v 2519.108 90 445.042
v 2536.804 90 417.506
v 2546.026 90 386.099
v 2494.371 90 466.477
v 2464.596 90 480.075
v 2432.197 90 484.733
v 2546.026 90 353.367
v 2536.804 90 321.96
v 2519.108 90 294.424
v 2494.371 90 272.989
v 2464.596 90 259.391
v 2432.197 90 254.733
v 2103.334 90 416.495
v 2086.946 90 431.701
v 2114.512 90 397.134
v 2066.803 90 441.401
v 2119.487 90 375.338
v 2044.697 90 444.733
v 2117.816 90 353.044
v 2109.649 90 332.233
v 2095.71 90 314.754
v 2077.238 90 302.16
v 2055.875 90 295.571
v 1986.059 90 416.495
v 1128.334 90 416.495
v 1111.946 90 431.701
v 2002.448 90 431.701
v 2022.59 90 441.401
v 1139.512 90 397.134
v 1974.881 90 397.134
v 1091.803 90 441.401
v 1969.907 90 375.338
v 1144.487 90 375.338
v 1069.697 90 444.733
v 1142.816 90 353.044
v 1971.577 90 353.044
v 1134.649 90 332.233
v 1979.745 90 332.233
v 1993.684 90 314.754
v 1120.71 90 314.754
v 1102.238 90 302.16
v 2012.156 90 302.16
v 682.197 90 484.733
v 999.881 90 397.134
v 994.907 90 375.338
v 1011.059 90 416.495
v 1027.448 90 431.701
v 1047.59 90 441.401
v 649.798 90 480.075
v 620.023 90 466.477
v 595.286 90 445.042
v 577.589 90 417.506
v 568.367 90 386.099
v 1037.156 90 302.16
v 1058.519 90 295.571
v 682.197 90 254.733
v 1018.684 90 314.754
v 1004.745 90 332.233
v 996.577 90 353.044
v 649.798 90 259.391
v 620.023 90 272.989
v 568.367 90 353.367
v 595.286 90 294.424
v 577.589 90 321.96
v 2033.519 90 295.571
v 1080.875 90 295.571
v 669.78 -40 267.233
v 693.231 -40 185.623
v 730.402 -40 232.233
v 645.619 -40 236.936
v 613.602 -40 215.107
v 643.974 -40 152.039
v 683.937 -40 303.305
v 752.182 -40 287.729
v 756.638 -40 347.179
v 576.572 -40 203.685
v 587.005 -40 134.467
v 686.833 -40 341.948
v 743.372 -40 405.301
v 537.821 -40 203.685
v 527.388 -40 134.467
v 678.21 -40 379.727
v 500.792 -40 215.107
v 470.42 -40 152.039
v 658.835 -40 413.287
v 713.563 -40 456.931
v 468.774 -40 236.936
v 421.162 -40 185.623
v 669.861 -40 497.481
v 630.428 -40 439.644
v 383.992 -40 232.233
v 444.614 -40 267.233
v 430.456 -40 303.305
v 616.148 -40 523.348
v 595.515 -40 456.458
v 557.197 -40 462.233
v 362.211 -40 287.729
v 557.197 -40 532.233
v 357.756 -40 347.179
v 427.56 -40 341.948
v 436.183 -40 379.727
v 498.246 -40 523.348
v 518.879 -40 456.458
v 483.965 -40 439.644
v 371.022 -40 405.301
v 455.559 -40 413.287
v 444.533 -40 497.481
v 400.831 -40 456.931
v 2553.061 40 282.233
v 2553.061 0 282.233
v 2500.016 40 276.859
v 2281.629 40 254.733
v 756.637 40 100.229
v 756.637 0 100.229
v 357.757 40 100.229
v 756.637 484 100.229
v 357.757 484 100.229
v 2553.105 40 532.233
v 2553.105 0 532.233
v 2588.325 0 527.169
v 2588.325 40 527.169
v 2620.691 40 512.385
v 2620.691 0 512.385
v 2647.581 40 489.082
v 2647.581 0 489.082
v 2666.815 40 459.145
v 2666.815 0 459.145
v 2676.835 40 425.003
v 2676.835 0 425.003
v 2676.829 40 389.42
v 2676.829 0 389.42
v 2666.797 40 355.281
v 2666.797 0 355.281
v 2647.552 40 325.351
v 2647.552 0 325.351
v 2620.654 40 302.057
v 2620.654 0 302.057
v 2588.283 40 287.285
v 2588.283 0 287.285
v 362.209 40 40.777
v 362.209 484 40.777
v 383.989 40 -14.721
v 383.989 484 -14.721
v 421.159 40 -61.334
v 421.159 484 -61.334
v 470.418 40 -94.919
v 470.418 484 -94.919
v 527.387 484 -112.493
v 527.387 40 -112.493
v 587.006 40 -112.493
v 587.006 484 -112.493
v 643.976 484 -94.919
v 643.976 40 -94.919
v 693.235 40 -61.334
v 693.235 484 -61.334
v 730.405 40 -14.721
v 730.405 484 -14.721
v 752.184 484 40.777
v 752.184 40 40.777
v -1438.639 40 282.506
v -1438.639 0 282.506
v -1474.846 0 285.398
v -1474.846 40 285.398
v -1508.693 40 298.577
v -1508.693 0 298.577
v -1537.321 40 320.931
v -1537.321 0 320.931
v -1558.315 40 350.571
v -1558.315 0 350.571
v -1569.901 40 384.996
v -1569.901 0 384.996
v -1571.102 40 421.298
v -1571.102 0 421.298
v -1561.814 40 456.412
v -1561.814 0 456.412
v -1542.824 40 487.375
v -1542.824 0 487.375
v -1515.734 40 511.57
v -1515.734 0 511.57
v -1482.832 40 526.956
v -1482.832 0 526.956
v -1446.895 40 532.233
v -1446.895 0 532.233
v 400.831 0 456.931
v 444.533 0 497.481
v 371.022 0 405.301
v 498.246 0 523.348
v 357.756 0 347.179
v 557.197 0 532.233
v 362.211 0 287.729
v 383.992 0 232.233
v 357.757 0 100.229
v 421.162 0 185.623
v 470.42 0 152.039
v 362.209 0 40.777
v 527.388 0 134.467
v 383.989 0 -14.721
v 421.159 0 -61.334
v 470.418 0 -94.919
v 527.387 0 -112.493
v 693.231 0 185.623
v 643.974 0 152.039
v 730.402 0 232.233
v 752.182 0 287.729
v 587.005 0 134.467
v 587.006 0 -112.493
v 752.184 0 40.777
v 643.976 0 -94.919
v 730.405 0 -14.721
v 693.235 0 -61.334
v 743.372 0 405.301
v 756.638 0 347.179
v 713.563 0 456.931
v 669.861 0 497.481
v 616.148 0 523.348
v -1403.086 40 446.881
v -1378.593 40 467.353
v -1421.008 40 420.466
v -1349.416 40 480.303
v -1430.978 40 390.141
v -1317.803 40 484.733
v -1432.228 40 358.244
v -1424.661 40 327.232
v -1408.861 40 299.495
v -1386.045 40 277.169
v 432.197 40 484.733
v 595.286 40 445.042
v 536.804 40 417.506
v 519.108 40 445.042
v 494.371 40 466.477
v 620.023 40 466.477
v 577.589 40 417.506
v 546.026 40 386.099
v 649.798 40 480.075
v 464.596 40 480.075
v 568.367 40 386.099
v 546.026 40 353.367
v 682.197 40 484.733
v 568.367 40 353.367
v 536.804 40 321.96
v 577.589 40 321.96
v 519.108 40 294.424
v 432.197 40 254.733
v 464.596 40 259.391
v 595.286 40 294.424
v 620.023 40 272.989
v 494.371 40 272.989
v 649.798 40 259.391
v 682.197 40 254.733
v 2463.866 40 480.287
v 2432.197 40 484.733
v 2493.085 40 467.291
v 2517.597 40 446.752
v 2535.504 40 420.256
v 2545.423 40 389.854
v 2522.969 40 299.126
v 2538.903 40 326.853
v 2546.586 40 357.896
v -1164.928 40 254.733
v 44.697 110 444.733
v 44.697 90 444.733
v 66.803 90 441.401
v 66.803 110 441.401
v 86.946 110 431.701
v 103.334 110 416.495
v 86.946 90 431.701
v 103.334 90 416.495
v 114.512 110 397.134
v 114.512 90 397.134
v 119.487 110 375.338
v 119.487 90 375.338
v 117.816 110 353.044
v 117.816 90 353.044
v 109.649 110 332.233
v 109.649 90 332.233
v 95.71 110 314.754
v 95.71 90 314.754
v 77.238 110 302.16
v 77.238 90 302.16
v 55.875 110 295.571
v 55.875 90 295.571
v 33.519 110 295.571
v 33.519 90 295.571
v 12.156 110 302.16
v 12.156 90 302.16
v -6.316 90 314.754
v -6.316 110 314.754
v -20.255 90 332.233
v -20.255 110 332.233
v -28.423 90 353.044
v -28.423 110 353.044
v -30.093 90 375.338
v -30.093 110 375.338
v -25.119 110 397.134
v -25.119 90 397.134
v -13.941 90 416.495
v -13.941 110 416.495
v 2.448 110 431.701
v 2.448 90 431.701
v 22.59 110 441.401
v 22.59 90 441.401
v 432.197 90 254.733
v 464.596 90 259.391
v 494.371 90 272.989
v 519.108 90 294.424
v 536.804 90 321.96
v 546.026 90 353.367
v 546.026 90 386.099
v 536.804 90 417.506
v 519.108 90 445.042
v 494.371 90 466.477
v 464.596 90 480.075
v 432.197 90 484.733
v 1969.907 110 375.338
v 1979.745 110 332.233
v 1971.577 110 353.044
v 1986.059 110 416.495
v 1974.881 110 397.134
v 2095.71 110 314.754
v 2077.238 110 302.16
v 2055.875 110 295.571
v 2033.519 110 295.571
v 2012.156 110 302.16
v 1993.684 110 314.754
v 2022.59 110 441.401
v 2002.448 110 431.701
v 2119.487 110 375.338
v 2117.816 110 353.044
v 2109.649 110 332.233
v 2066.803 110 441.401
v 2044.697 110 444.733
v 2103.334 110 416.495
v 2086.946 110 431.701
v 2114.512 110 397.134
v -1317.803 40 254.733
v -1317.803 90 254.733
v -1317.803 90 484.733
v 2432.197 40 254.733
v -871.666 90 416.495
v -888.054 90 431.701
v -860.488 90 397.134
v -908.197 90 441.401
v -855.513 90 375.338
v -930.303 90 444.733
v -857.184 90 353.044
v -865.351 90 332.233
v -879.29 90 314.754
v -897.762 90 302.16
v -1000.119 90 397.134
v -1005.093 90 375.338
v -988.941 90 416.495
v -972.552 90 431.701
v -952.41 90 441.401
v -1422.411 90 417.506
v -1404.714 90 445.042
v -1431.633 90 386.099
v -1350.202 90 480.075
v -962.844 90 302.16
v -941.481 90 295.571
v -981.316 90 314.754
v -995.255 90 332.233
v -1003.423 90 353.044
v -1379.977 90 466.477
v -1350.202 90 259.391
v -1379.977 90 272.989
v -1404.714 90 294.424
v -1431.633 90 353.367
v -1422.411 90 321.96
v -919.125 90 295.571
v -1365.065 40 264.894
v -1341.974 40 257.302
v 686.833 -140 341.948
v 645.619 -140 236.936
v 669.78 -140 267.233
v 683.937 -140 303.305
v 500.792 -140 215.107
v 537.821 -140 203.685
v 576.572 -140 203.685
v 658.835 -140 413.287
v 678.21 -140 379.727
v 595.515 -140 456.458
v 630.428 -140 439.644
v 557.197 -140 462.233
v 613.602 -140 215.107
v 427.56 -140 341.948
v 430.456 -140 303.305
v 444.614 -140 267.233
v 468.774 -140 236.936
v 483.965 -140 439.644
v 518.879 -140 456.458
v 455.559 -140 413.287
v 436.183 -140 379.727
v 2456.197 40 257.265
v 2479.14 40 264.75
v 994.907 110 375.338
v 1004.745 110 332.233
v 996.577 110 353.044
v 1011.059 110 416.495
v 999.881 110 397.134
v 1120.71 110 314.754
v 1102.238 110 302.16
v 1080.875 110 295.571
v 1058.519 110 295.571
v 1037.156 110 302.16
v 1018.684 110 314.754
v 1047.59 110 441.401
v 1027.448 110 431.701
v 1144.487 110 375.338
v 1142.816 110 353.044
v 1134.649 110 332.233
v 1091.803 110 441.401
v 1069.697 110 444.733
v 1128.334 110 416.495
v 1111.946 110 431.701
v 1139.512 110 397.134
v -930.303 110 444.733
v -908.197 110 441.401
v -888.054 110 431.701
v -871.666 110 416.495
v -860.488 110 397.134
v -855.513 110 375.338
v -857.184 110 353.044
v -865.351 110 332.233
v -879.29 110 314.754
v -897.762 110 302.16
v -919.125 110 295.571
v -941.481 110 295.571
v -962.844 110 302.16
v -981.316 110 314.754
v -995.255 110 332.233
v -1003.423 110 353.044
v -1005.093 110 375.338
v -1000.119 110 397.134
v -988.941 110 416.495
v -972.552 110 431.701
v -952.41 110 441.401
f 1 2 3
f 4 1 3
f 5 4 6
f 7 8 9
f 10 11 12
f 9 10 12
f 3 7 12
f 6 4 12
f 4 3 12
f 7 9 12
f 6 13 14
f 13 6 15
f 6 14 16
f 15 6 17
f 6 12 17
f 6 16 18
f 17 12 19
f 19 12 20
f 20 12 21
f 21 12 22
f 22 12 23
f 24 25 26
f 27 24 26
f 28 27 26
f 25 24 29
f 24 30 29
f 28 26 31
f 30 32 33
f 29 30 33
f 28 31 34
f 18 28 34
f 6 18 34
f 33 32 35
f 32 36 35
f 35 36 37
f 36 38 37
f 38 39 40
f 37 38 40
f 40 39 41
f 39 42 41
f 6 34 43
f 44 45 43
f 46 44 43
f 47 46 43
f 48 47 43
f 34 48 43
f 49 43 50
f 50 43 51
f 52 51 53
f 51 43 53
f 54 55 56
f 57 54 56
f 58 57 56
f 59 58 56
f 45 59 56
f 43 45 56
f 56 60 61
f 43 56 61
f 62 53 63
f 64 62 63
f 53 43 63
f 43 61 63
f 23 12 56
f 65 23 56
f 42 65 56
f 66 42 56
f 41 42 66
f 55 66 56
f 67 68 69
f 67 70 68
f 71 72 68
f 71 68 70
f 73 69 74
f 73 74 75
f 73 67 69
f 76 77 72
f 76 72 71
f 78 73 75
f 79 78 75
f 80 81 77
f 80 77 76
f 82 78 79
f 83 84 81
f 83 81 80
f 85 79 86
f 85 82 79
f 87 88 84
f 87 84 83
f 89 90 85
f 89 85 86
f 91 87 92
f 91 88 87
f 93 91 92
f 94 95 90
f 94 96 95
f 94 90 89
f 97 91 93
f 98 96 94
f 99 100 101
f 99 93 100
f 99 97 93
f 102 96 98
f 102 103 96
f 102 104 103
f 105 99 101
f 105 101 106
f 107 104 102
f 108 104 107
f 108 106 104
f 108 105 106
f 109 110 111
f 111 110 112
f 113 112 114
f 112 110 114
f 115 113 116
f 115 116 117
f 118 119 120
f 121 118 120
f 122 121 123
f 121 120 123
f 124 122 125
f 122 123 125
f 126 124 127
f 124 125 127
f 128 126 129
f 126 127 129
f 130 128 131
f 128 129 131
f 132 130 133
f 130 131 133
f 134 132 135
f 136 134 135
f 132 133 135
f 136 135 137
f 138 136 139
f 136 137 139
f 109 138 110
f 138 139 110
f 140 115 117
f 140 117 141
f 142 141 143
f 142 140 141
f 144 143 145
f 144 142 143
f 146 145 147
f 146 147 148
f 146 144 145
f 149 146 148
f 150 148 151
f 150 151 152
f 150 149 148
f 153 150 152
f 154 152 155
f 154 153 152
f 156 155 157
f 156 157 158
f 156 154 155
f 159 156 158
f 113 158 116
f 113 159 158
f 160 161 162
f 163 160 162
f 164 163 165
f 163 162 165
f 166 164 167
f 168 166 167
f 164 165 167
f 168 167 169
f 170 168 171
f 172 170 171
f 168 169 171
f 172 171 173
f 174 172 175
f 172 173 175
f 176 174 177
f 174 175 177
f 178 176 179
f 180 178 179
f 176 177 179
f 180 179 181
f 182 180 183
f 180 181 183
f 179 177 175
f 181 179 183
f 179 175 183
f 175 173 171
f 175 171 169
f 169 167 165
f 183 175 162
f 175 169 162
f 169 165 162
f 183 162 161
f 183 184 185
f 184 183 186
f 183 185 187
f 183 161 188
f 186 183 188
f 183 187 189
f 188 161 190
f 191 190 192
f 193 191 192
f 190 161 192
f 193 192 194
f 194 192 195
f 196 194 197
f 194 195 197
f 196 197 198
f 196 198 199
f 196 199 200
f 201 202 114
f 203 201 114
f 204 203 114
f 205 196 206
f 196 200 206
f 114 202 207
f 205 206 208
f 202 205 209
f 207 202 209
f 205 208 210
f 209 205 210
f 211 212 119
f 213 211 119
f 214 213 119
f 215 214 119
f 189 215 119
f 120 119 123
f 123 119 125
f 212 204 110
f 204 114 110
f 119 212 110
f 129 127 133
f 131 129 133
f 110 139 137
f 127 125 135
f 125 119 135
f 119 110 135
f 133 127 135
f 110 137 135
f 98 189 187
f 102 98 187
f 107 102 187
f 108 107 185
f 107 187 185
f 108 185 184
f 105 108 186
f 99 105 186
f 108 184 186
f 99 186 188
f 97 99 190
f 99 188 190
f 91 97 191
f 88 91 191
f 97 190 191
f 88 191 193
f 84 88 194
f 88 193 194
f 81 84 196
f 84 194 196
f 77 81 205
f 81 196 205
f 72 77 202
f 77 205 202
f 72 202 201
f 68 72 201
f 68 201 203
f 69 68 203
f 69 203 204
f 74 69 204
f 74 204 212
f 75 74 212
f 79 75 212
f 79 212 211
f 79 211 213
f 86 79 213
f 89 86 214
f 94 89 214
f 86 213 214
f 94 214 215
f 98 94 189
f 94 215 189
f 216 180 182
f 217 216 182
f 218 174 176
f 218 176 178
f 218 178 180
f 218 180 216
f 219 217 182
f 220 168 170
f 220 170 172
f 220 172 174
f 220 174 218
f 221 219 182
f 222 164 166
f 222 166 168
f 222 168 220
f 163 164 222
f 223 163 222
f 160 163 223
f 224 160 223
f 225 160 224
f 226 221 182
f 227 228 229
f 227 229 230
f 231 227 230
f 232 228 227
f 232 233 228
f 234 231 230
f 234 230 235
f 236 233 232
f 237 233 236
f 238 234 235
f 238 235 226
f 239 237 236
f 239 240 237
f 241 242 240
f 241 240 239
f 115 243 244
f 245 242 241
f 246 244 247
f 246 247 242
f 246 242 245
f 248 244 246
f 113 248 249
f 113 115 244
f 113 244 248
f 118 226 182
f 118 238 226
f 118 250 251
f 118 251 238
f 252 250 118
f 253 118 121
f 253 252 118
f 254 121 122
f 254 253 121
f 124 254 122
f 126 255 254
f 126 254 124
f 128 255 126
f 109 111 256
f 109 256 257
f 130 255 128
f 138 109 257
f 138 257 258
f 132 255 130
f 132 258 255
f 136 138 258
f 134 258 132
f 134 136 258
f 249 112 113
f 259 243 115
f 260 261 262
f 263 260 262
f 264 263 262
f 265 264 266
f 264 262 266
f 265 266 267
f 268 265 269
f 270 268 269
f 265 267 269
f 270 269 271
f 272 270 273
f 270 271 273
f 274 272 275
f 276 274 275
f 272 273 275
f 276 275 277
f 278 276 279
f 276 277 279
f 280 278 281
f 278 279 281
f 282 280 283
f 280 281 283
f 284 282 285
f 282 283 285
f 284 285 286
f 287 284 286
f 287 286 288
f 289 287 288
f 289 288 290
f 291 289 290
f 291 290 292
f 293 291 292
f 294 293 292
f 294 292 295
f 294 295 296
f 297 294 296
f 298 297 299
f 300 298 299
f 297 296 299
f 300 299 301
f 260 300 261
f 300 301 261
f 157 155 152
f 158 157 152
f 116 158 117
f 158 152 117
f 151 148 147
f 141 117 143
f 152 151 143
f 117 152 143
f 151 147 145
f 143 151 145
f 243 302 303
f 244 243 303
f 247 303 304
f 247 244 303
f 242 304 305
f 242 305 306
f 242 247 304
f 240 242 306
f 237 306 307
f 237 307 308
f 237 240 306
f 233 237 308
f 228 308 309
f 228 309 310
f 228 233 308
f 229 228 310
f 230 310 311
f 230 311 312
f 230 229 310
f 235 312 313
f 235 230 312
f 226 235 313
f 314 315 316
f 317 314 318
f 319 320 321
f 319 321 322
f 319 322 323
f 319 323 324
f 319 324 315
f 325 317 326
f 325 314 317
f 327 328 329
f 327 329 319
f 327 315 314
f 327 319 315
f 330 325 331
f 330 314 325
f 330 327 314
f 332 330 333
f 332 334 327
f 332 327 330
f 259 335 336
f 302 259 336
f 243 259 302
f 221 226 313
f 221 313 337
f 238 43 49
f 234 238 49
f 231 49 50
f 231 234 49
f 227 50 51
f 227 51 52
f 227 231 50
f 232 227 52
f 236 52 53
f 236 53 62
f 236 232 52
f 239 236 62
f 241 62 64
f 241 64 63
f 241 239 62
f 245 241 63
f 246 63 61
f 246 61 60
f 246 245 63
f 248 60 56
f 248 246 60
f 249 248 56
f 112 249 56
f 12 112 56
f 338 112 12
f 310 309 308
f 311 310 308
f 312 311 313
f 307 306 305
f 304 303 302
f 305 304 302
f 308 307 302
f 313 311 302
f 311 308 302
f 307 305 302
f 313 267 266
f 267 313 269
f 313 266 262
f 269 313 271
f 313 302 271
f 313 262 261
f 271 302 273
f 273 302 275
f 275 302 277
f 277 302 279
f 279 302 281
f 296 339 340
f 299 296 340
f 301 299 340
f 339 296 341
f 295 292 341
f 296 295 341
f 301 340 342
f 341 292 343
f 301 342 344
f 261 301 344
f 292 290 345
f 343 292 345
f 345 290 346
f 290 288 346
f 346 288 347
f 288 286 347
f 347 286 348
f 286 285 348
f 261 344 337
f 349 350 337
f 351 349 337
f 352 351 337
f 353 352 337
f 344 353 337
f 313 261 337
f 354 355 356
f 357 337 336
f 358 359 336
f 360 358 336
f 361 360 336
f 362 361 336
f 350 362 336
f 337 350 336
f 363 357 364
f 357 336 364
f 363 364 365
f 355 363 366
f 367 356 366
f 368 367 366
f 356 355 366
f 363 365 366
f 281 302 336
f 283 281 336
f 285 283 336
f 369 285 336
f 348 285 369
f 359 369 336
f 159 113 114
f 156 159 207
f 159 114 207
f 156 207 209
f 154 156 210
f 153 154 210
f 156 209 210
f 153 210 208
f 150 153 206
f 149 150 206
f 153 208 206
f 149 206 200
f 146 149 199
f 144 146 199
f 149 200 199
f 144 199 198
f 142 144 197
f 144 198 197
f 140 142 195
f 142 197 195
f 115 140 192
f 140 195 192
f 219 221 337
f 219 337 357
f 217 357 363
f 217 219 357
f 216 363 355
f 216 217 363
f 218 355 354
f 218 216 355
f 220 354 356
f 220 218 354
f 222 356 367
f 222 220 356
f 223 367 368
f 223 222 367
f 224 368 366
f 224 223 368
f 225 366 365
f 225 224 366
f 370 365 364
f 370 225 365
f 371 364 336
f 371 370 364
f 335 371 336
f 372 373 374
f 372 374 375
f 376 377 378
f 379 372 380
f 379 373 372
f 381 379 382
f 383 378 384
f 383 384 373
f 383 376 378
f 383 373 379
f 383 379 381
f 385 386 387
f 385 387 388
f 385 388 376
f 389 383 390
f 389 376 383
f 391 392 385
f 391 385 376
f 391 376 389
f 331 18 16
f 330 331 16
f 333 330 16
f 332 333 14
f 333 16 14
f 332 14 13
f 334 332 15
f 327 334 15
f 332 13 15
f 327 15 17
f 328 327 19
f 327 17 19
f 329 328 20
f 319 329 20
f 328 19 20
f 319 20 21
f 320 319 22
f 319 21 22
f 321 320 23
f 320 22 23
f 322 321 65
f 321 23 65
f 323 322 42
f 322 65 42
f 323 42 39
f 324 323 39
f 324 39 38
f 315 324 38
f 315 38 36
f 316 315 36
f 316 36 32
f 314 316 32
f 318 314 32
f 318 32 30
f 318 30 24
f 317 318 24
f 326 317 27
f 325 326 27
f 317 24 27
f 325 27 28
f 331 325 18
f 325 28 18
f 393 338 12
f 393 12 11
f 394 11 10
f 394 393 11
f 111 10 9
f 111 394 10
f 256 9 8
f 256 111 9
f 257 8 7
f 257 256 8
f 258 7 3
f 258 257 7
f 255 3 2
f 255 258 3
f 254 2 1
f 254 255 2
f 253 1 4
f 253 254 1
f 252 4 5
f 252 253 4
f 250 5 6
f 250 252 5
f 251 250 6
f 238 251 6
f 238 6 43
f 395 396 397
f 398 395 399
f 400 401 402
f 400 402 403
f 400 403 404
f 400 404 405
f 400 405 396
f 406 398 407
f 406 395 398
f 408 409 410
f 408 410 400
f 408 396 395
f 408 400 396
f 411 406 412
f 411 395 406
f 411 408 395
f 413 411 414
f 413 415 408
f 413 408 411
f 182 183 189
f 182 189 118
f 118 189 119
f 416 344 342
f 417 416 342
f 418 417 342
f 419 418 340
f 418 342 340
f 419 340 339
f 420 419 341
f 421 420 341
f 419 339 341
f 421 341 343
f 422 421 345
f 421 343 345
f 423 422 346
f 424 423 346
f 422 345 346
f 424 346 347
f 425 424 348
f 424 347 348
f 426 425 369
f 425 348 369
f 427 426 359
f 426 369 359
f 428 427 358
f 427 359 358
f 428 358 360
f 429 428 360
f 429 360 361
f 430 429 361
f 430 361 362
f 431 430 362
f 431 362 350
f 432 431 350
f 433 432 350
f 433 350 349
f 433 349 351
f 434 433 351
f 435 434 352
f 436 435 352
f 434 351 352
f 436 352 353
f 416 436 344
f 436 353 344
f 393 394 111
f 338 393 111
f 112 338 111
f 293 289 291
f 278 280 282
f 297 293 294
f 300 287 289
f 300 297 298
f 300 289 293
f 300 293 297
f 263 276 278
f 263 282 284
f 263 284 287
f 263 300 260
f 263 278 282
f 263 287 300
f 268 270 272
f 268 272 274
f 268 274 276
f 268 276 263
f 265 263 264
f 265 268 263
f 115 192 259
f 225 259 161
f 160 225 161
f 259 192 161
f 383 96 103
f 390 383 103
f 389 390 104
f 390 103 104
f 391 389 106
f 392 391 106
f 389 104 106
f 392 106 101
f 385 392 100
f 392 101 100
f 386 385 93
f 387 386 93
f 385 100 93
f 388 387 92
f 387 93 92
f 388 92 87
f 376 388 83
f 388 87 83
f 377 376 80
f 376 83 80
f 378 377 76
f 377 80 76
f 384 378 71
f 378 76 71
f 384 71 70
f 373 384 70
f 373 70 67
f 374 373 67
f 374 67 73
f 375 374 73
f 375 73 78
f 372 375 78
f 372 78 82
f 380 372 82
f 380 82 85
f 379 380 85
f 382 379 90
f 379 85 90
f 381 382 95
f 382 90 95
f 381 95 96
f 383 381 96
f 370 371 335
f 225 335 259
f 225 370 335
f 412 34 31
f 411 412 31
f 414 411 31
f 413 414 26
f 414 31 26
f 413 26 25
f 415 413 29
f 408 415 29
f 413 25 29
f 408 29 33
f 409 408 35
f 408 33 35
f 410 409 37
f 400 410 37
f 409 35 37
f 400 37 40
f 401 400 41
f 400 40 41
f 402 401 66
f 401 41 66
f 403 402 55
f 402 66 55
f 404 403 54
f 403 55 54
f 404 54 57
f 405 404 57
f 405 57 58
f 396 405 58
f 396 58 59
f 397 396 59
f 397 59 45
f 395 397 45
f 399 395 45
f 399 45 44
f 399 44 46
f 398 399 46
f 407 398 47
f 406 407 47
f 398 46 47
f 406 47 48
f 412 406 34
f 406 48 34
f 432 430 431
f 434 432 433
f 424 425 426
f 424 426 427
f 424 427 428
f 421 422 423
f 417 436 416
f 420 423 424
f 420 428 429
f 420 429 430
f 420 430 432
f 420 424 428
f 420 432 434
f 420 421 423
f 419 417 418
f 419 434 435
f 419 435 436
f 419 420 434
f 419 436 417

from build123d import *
from build123d.topology import SkipClean

# Parameters (mm, degrees)
BOSS_EXTRUDE1_DEPTH = 40
BOSS_EXTRUDE2_DEPTH = 50
SKETCH3_R           = 75
BOSS_EXTRUDE3_DEPTH = 20
SKETCH4_R           = 200
BOSS_EXTRUDE4_DEPTH = 40
BOSS_EXTRUDE5_DEPTH = 444
SKETCH6_R           = 130
BOSS_EXTRUDE6_DEPTH = 100


with BuildPart() as part:
    # Sketch1 → Boss-Extrude1 (new body)
    with BuildSketch(Plane(origin=(0, 0, 0), x_dir=(1, 0, 0), z_dir=(0, 1, 0))):
        with BuildLine():
            Line((-1446.895354921, -532.23311623), (2553.104645079, -532.23311623))
            ThreePointArc((2553.104645079, -532.23311623), (2678.104643133, -407.21106021), (2553.060533039, -282.233124013))
            Line((2553.060533039, -282.233124013), (756.636813569, -100.229265467))
            ThreePointArc((756.636813569, -100.229265467), (557.196813569, 114.72688377), (357.756813569, -100.229265467))
            Line((357.756813569, -100.229265467), (-1438.639231703, -282.506068524))
            ThreePointArc((-1438.639231703, -282.506068524), (-1571.827098211, -403.102799246), (-1446.895354921, -532.23311623))
        make_face()
    extrude(amount=BOSS_EXTRUDE1_DEPTH)

    # Sketch2 → Boss-Extrude2 (add)
    with BuildSketch(Plane(origin=(0, 40, 0), x_dir=(1, 0, 0), z_dir=(0, 1, 0))):
        with BuildLine():
            Line((682.196813569, -254.73311623), (2432.196813569, -254.73311623))
            ThreePointArc((2432.196813569, -254.73311623), (2547.196813569, -369.73311623), (2432.196813569, -484.73311623))
            Line((2432.196813569, -484.73311623), (682.196813569, -484.73311623))
            ThreePointArc((682.196813569, -484.73311623), (567.196813569, -369.73311623), (682.196813569, -254.73311623))
        make_face()
        with BuildLine():
            Line((432.196813569, -484.73311623), (-1317.803186431, -484.73311623))
            ThreePointArc((-1317.803186431, -484.73311623), (-1432.803186431, -369.73311623), (-1317.803186431, -254.73311623))
            Line((-1317.803186431, -254.73311623), (432.196813569, -254.73311623))
            ThreePointArc((432.196813569, -254.73311623), (547.196813569, -369.73311623), (432.196813569, -484.73311623))
        make_face()
    extrude(amount=BOSS_EXTRUDE2_DEPTH)

    # Sketch3 → Boss-Extrude3 (add)
    with BuildSketch(Plane(origin=(0, 90, 0), x_dir=(1, 0, 0), z_dir=(0, 1, 0))):
        with Locations(Location((-930.303186431, -369.73311623, 0), (0, 0, 270))):
            Circle(SKETCH3_R)
        with Locations(Location((44.696813569, -369.73311623, 0), (0, 0, 270))):
            Circle(SKETCH3_R)
        with Locations(Location((1069.696813569, -369.73311623, 0), (0, 0, 270))):
            Circle(SKETCH3_R)
        with Locations(Location((2044.696813569, -369.73311623, 0), (0, 0, 270))):
            Circle(SKETCH3_R)
    extrude(amount=BOSS_EXTRUDE3_DEPTH)

    # Sketch4 → Boss-Extrude4 (add)
    with BuildSketch(Plane(origin=(0, 0, 0), x_dir=(-1, 0, 0), z_dir=(0, -1, 0))):
        with Locations(Location((-557.196813569, -332.23311623, 0), (0, 0, 270))):
            Circle(SKETCH4_R)
    extrude(amount=BOSS_EXTRUDE4_DEPTH)

    # Sketch5 → Boss-Extrude5 (add)
    with SkipClean():  # the faces are left unmerged after this step: merging them gives an invalid solid
        with BuildSketch(Plane(origin=(0, 40, 0), x_dir=(1, 0, 0), z_dir=(0, 1, 0))):
            with BuildLine():
                Line((756.636813569, -100.229265467), (357.756813569, -100.229265467))
                ThreePointArc((357.756813569, -100.229265467), (557.196813569, 114.72688377), (756.636813569, -100.229265467))
            make_face()
        extrude(amount=BOSS_EXTRUDE5_DEPTH)

    # Sketch6 → Boss-Extrude6 (add)
    with SkipClean():  # the faces are left unmerged after this step: merging them gives an invalid solid
        with BuildSketch(Plane.XZ.offset(40)):
            with Locations(Location((557.196813569, 332.23311623, 0), (0, 0, 90))):
                Circle(SKETCH6_R)
        extrude(amount=BOSS_EXTRUDE6_DEPTH)


solid = part.part
